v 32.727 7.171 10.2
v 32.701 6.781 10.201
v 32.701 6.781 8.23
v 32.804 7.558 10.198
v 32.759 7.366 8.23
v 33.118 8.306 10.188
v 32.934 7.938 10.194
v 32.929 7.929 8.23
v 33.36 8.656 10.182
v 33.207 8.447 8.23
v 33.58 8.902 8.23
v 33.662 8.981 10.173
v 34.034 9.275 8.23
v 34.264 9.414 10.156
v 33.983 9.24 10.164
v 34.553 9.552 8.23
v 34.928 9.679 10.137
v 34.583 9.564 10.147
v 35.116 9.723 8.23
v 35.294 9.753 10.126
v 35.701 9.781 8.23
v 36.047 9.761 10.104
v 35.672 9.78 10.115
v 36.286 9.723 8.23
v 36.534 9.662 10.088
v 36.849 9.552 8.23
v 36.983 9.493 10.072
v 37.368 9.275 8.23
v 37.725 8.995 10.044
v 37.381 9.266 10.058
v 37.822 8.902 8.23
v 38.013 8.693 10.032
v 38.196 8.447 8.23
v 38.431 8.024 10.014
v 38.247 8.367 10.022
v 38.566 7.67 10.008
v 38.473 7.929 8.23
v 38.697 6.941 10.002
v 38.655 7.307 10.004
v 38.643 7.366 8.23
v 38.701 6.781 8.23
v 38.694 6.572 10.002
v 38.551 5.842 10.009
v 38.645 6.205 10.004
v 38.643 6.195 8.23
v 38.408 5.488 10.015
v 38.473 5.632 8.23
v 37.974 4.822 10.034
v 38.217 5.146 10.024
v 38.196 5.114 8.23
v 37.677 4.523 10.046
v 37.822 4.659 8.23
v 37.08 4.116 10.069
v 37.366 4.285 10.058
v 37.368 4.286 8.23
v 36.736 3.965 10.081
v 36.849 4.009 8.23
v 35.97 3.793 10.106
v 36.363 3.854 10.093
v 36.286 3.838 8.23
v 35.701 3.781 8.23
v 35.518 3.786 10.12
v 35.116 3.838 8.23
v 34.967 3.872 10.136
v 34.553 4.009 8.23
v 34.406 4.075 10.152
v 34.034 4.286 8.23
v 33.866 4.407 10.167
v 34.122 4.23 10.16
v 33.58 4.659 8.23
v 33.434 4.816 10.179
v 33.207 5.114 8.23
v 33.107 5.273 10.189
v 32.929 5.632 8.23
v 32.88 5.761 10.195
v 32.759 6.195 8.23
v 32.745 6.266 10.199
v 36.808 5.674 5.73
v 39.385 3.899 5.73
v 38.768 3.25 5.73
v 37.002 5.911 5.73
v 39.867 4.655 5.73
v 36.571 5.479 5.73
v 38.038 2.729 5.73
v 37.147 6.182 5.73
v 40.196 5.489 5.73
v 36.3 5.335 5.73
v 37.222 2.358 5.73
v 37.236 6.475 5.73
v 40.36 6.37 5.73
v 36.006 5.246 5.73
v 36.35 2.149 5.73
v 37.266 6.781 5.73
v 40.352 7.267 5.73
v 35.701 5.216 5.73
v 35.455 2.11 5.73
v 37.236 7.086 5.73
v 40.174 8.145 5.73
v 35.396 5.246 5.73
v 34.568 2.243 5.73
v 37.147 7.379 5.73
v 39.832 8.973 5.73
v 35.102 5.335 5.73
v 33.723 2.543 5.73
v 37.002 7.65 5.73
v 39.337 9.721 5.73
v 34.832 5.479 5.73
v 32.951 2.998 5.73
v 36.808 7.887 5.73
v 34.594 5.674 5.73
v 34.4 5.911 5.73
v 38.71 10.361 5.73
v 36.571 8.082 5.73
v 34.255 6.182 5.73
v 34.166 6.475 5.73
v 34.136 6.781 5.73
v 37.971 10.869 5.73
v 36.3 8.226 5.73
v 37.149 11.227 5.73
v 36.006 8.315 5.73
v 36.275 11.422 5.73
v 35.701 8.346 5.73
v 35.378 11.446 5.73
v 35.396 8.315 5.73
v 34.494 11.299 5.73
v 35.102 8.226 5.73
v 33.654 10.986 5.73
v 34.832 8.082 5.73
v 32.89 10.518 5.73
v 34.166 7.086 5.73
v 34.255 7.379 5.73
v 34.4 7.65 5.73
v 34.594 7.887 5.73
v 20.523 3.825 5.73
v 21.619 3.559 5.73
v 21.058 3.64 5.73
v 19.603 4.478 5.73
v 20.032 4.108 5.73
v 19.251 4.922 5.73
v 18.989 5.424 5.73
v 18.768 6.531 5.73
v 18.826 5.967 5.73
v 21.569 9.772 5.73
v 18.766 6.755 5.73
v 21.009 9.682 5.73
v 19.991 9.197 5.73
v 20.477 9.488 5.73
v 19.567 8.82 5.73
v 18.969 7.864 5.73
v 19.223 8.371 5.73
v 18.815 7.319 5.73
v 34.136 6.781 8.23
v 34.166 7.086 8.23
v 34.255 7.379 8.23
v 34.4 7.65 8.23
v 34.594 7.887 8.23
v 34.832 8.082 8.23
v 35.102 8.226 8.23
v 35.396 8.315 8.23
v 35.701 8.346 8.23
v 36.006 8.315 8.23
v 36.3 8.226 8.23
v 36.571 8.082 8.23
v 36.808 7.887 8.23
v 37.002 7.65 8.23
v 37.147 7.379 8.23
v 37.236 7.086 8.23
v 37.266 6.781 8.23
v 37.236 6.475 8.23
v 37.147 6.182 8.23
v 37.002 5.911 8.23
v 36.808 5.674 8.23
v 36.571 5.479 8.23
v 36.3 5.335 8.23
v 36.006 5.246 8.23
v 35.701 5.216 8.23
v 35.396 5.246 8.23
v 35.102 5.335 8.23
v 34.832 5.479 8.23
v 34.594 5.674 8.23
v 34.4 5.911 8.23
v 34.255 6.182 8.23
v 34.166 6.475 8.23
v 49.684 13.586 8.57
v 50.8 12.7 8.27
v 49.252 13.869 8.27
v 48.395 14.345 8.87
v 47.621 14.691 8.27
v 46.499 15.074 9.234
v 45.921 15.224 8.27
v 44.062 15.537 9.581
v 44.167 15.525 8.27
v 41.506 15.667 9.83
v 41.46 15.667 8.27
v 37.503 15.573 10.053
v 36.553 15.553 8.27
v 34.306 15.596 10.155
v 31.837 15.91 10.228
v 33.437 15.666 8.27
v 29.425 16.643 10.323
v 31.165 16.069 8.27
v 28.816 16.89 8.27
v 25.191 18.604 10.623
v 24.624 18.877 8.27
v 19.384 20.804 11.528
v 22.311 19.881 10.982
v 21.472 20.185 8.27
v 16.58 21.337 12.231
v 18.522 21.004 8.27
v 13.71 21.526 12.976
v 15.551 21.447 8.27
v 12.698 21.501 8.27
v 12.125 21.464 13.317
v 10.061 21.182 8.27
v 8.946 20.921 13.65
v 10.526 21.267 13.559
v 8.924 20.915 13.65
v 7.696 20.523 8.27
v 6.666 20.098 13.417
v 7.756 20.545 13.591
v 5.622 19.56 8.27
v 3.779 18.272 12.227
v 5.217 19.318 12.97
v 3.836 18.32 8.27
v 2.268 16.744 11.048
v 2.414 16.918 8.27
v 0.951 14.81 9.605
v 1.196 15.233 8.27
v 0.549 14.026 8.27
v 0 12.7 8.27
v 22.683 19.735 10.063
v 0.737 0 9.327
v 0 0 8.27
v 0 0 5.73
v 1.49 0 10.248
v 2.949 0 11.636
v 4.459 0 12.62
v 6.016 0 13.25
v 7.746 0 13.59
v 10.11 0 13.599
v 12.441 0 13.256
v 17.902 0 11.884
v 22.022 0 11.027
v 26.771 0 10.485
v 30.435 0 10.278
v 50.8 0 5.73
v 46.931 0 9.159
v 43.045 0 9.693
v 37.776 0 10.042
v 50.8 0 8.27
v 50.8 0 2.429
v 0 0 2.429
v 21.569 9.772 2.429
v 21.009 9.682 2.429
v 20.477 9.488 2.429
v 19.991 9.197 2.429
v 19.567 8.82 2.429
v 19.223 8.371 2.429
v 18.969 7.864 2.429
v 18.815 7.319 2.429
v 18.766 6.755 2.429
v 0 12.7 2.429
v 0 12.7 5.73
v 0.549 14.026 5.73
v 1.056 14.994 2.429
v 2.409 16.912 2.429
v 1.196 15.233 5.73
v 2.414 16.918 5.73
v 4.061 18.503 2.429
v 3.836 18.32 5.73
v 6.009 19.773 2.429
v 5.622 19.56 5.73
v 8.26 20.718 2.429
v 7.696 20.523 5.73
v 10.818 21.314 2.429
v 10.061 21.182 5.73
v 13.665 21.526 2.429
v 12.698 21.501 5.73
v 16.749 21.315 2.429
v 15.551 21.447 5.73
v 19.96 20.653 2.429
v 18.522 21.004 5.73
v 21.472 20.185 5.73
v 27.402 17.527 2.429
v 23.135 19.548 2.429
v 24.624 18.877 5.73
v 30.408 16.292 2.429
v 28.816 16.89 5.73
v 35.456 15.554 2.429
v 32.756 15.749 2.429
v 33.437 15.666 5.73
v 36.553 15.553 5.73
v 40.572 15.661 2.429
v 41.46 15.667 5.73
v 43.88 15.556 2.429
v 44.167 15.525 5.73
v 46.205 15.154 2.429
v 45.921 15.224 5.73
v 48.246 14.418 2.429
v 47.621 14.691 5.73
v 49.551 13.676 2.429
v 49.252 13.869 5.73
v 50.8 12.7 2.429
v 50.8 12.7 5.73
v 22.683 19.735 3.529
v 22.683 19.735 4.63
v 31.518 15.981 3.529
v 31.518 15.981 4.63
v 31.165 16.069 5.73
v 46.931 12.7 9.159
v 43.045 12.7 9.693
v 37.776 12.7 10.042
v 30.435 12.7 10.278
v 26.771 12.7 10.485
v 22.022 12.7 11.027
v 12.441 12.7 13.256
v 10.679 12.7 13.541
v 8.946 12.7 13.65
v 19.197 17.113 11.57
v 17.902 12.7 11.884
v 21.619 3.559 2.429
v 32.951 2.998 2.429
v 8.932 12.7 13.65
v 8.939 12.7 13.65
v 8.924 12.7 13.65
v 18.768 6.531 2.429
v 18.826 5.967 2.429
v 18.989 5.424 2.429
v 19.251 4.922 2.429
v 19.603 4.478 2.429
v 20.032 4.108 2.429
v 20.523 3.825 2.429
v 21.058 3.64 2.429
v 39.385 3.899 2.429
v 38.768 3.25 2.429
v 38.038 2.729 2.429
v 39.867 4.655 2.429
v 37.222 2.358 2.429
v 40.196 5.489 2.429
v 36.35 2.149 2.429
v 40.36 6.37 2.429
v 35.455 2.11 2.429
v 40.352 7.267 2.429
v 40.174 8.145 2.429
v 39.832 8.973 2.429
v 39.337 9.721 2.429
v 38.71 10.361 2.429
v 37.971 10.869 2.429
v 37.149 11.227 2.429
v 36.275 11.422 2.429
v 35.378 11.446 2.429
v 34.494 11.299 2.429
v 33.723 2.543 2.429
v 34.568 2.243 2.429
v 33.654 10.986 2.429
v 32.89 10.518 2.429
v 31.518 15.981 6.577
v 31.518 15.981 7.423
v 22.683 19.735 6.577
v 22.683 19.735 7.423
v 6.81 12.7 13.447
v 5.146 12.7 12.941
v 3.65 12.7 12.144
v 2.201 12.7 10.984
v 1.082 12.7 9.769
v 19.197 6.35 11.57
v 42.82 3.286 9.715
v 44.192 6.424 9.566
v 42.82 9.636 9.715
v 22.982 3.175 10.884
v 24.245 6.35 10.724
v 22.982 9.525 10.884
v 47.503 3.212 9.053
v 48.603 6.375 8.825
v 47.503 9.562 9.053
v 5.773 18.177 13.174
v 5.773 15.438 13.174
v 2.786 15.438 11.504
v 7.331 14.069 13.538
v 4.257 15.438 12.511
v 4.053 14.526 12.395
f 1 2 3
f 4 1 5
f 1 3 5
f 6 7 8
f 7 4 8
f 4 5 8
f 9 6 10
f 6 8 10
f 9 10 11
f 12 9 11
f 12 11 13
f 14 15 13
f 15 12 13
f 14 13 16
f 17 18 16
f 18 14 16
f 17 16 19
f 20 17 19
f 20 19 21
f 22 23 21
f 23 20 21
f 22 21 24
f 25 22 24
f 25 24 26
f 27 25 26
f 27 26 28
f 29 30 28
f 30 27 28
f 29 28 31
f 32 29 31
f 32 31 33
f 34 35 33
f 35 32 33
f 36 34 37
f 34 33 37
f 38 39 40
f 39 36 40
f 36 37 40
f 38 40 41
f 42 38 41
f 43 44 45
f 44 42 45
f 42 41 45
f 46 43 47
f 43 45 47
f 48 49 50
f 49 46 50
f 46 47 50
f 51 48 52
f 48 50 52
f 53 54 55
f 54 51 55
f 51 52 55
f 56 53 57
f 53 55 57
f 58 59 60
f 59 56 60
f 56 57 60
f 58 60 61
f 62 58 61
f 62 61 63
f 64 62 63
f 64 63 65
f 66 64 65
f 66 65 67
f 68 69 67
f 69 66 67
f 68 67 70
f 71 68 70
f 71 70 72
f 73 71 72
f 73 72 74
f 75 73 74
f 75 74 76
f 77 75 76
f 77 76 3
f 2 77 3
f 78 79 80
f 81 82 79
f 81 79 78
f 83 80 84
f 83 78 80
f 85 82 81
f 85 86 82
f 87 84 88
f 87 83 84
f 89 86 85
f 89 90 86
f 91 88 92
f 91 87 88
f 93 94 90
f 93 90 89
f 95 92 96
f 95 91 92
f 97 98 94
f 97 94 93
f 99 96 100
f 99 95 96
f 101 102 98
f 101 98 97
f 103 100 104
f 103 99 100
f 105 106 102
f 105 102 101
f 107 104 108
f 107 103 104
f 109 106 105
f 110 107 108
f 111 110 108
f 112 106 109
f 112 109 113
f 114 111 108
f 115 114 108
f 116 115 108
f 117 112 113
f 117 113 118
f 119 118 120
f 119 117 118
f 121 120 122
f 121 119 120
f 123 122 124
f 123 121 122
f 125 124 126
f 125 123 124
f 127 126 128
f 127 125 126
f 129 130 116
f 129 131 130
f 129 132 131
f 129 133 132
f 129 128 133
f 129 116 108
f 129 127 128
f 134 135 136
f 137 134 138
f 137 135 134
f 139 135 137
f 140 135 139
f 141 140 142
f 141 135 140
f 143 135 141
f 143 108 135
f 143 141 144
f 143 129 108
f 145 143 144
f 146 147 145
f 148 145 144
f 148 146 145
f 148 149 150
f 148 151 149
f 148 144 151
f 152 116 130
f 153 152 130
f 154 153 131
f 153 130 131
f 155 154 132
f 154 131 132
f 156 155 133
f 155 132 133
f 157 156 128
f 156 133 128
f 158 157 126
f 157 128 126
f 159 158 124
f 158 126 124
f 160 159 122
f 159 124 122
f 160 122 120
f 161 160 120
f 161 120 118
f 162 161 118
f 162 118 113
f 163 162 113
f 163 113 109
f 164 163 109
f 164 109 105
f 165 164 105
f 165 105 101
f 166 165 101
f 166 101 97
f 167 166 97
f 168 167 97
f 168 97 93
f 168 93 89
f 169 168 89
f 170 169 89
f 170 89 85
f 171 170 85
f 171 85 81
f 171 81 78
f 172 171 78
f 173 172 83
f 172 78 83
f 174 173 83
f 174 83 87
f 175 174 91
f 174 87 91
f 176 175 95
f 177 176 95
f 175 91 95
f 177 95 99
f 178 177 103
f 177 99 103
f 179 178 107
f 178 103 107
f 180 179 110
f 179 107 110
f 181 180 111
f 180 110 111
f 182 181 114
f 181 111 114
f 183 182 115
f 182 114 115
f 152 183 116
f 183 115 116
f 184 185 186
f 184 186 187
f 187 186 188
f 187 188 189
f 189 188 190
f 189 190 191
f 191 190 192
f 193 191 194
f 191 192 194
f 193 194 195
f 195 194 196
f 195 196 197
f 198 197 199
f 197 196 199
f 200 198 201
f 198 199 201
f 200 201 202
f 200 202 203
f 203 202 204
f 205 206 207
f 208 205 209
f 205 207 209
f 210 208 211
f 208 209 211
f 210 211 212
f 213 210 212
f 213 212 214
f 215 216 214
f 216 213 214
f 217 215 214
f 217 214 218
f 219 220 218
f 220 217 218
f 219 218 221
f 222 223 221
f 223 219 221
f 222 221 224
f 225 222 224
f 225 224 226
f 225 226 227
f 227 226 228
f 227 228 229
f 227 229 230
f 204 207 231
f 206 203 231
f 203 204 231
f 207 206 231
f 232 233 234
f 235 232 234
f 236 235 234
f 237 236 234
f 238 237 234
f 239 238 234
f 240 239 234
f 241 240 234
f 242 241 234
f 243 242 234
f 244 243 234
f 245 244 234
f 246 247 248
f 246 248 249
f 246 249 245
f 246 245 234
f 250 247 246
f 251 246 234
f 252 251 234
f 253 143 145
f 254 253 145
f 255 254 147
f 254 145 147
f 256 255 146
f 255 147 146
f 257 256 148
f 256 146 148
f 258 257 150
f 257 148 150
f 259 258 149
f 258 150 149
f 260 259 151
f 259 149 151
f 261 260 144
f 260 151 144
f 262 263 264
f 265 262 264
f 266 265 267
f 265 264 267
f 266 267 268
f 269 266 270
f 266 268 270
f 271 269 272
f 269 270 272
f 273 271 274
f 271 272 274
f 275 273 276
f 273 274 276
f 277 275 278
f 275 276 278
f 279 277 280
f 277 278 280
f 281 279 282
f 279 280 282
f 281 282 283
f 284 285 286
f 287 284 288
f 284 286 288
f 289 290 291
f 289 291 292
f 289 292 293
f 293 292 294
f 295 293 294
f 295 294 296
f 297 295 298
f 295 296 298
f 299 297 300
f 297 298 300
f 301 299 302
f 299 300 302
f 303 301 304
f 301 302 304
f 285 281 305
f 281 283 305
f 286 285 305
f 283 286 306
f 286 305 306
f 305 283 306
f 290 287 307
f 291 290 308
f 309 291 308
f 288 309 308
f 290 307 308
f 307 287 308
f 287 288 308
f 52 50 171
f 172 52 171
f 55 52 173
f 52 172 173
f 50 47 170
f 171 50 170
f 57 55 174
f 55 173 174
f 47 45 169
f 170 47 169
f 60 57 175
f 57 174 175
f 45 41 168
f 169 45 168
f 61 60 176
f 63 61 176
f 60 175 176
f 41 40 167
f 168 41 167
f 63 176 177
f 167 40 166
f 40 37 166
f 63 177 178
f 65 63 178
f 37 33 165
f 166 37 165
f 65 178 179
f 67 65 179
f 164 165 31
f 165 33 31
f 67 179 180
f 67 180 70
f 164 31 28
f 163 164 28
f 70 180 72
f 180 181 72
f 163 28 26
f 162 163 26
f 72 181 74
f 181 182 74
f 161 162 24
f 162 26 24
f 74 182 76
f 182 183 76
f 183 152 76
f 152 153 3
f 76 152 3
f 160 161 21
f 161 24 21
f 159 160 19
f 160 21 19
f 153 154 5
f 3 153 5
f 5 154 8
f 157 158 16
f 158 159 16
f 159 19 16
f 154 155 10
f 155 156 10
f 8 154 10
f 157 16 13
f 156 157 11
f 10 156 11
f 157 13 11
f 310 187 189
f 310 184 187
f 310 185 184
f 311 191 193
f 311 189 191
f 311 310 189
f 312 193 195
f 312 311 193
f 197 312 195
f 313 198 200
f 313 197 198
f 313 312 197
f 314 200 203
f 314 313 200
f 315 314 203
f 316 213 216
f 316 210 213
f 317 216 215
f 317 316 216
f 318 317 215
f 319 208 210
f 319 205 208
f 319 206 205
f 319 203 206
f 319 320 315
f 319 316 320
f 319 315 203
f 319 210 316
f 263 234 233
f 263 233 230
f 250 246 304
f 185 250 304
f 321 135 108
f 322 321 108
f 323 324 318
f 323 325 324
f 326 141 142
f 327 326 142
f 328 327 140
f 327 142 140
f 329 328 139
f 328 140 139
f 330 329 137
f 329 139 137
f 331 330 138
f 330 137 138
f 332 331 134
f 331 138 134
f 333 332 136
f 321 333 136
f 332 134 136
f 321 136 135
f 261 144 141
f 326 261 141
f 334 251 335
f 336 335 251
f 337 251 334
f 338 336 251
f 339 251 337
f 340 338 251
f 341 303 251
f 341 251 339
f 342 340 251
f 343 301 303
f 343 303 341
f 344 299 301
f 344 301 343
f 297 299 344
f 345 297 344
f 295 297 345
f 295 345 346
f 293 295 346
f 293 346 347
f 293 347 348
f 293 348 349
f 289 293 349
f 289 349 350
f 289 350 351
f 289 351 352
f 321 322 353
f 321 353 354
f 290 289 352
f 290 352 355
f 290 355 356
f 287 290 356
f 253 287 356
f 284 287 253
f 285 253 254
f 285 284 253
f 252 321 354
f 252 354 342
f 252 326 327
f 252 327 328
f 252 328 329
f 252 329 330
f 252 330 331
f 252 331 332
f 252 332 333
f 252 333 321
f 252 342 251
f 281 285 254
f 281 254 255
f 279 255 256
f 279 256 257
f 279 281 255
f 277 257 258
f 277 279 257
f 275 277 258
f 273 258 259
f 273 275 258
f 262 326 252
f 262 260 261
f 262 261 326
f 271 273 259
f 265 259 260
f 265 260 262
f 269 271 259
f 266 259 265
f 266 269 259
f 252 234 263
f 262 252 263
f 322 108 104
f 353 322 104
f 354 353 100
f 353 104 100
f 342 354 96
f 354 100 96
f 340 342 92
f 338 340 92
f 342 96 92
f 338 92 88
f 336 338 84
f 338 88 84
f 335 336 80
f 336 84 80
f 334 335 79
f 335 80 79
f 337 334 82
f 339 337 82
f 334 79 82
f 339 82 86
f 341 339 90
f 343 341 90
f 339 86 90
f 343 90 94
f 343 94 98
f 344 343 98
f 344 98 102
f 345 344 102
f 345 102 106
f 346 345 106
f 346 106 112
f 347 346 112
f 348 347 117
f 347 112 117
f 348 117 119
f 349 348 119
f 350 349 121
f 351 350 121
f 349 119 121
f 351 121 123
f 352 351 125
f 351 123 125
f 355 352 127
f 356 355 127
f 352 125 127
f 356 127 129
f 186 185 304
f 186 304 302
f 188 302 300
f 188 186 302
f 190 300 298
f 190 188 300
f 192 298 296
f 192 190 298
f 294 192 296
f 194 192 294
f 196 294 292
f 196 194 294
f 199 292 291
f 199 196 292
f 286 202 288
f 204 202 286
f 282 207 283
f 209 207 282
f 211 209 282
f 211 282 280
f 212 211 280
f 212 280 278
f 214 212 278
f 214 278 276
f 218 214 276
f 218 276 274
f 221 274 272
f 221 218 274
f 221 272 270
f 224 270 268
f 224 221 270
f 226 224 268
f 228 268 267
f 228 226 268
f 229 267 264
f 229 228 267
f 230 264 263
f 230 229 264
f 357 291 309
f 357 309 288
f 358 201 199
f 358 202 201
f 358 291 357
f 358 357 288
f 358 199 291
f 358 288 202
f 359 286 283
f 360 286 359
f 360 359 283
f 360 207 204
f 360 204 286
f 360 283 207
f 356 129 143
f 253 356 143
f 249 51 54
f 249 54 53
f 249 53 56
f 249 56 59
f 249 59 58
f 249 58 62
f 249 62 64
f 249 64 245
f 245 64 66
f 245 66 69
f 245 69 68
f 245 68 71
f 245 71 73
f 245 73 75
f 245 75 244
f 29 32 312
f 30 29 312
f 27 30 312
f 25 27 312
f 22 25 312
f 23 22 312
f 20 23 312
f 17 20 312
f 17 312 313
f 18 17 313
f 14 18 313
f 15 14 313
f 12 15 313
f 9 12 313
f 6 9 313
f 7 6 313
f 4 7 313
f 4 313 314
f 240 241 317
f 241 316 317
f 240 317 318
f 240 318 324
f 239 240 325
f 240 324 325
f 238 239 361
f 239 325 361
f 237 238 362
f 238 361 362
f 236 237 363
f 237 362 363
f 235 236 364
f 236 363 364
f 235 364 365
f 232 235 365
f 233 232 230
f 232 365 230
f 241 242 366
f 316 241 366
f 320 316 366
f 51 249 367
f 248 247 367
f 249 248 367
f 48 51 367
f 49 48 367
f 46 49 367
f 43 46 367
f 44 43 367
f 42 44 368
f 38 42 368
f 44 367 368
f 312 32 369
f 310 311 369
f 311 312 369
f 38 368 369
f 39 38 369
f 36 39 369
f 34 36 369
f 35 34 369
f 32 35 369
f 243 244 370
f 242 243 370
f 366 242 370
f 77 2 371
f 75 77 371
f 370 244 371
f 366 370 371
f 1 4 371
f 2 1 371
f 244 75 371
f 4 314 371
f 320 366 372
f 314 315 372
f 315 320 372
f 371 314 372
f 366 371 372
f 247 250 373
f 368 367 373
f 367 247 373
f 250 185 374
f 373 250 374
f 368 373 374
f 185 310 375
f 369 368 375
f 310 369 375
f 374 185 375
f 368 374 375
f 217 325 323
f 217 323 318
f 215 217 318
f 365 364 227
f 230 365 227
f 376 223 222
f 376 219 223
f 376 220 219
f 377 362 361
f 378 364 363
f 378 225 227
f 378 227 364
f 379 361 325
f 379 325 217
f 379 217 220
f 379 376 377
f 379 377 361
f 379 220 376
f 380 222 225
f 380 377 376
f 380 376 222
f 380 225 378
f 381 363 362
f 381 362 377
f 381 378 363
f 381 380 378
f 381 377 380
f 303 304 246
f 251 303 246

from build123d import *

# Parameters (mm, degrees)
SKETCH1_W             = 50.8
SKETCH1_H             = 12.7
BOSS_EXTRUDE1_DEPTH   = 2.54
BOSS_EXTRUDE2_DEPTH   = 2.54
BOSS_EXTRUDE3_START   = -12.6999999
BOSS_EXTRUDE3_DEPTH   = 12.6999999
BOSS_EXTRUDE3_START_2 = 8.27
BOSS_EXTRUDE3_2_DEPTH = 5.379804836
BOSS_EXTRUDE3_START_3 = 12.6999999
BOSS_EXTRUDE3_3_DEPTH = 8.826210912
BOSS_EXTRUDE4_DEPTH   = 3.301
SKETCH8_R             = 1.565
CUT_EXTRUDE2_DEPTH    = 56.73814806
SKETCH9_R             = 3
CUT_EXTRUDE3_DEPTH    = 2.54


with BuildPart() as part:
    # Sketch1 → Boss-Extrude1 (new body)
    with BuildSketch(Plane.XY.offset(5.73)):
        with Locations((25.4, 6.35)):
            Rectangle(SKETCH1_W, SKETCH1_H)
    extrude(amount=BOSS_EXTRUDE1_DEPTH)

    # Sketch2 → Boss-Extrude2 (add)
    with BuildSketch(Plane.XY.offset(8.27)):
        with BuildLine():
            Line((50.8, 12.7), (0, 12.7))
            add(Edge.make_bspline(
                [(50.8, 12.7), (45.272528283, 17.710424363), (34.142821947, 12.960220977), (18.373174323, 23.382841195), (3.436669092, 22.27035247), (0, 12.7)],
                knots=[0, 0, 0, 0, 0.358140924, 0.531313139, 1, 1, 1, 1], degree=3))
        make_face()
    extrude(amount=-BOSS_EXTRUDE2_DEPTH)

    # Boss-Extrude3: read off the stored shape, not the designer's step
    # Boss-Extrude3 outline → Boss-Extrude3 (add)
    with BuildSketch(Plane.XZ.offset(BOSS_EXTRUDE3_START)):
        with BuildLine():
            Line((0, 8.27), (50.8, 8.27))
            add(Edge.make_bspline(
                [(50.8, 8.27), (40.389049097, 11.242926836), (22.785833475, 7.806208143), (5.402288522, 16.640851878), (0, 8.27)],
                knots=[0, 0, 0, 0, 0.60422821, 1, 1, 1, 1], degree=3))
        make_face()
    extrude(amount=BOSS_EXTRUDE3_DEPTH)

    # Boss-Extrude3 2 outline → Boss-Extrude3 2 (add)
    with BuildSketch(Plane.XY.offset(BOSS_EXTRUDE3_START_2)):
        with BuildLine():
            Line((0, 12.7), (50.8, 12.7))
            add(Edge.make_bspline(
                [(50.8, 12.7), (45.272528283, 17.710424363), (34.142821947, 12.960220977), (18.373174323, 23.382841195), (3.436669092, 22.27035247), (0, 12.7)],
                knots=[0, 0, 0, 0, 0.358140924, 0.531313139, 1, 1, 1, 1], degree=3))
        make_face()
    extrude(amount=BOSS_EXTRUDE3_2_DEPTH)

    # Boss-Extrude3 3 outline → Boss-Extrude3 3 (cut)
    with BuildSketch(Plane(origin=(0, 0, 0), x_dir=(1, 0, 0), z_dir=(0, 1, 0)).offset(BOSS_EXTRUDE3_START_3)):
        with BuildLine():
            Line((50.8, -13.649804836), (50.8, -8.27))
            add(Edge.make_bspline(
                [(50.8, -8.27), (40.389049097, -11.242926836), (26.239022787, -8.48038271), (12.230935741, -13.646926994), (8.946408095, -13.649804836)],
                knots=[0, 0, 0, 0, 0.60422821, 0.803831903, 0.803831903, 0.803831903, 0.803831903], degree=3))
            Line((8.946408095, -13.649804836), (50.8, -13.649804836))
        make_face()
        with BuildLine():
            Line((0, -13.649804836), (8.924280918, -13.649804836))
            add(Edge.make_bspline(
                [(8.924280918, -13.649804836), (5.704518452, -13.646980078), (2.671577153, -12.409611674), (0, -8.27)],
                knots=[0.804280192, 0.804280192, 0.804280192, 0.804280192, 1, 1, 1, 1], degree=3))
            Line((0, -8.27), (0, -13.649804836))
        make_face()
    extrude(amount=BOSS_EXTRUDE3_3_DEPTH, mode=Mode.SUBTRACT)

    # Sketch4 → Boss-Extrude4 (add)
    with BuildSketch(Plane.XY.offset(5.73)):
        with BuildLine():
            Line((50.8, 0), (0, 0))
            Line((0, 0), (0, 12.7))
            add(Edge.make_bspline(
                [(0, 12.7), (3.436669092, 22.27035247), (18.373174323, 23.382841195), (34.142821947, 12.960220977), (45.272528283, 17.710424363), (50.8, 12.7)],
                knots=[0, 0, 0, 0, 0.468686861, 0.641859076, 1, 1, 1, 1], degree=3))
            Line((50.8, 12.7), (50.8, 0))
        make_face()
        with BuildLine():
            Line((32.889743891, 10.517784199), (21.568597255, 9.772479468))
            ThreePointArc((21.568597255, 9.772479468), (19.56744695, 8.820482655), (18.765769151, 6.754517218))
            Line((18.765769151, 6.754517218), (18.767593963, 6.53054964))
            ThreePointArc((18.767593963, 6.53054964), (19.602828658, 4.477921208), (21.619225352, 3.558657997))
            Line((21.619225352, 3.558657997), (32.951013165, 2.997921646))
            ThreePointArc((32.951013165, 2.997921646), (40.377614255, 6.818611934), (32.889743891, 10.517784199))
        make_face(mode=Mode.SUBTRACT)
    extrude(amount=-BOSS_EXTRUDE4_DEPTH)

    # Sketch8 → Cut-Extrude2 (cut, through all)
    with BuildSketch(Plane(origin=(0, 0, 5.73), x_dir=(-1, 0, 0), z_dir=(0, 0, -1))):
        with Locations((-35.701119475, 6.780509451)):
            Circle(SKETCH8_R)
    extrude(amount=-CUT_EXTRUDE2_DEPTH, mode=Mode.SUBTRACT)

    # Sketch9 → Cut-Extrude3 (cut)
    with BuildSketch(Plane(origin=(0, 0, 8.23000008), x_dir=(-1, 0, 0), z_dir=(0, 0, -1))):
        with Locations((-35.701119475, 6.780509451)):
            Circle(SKETCH9_R)
    extrude(amount=-CUT_EXTRUDE3_DEPTH, mode=Mode.SUBTRACT)


solid = part.part
